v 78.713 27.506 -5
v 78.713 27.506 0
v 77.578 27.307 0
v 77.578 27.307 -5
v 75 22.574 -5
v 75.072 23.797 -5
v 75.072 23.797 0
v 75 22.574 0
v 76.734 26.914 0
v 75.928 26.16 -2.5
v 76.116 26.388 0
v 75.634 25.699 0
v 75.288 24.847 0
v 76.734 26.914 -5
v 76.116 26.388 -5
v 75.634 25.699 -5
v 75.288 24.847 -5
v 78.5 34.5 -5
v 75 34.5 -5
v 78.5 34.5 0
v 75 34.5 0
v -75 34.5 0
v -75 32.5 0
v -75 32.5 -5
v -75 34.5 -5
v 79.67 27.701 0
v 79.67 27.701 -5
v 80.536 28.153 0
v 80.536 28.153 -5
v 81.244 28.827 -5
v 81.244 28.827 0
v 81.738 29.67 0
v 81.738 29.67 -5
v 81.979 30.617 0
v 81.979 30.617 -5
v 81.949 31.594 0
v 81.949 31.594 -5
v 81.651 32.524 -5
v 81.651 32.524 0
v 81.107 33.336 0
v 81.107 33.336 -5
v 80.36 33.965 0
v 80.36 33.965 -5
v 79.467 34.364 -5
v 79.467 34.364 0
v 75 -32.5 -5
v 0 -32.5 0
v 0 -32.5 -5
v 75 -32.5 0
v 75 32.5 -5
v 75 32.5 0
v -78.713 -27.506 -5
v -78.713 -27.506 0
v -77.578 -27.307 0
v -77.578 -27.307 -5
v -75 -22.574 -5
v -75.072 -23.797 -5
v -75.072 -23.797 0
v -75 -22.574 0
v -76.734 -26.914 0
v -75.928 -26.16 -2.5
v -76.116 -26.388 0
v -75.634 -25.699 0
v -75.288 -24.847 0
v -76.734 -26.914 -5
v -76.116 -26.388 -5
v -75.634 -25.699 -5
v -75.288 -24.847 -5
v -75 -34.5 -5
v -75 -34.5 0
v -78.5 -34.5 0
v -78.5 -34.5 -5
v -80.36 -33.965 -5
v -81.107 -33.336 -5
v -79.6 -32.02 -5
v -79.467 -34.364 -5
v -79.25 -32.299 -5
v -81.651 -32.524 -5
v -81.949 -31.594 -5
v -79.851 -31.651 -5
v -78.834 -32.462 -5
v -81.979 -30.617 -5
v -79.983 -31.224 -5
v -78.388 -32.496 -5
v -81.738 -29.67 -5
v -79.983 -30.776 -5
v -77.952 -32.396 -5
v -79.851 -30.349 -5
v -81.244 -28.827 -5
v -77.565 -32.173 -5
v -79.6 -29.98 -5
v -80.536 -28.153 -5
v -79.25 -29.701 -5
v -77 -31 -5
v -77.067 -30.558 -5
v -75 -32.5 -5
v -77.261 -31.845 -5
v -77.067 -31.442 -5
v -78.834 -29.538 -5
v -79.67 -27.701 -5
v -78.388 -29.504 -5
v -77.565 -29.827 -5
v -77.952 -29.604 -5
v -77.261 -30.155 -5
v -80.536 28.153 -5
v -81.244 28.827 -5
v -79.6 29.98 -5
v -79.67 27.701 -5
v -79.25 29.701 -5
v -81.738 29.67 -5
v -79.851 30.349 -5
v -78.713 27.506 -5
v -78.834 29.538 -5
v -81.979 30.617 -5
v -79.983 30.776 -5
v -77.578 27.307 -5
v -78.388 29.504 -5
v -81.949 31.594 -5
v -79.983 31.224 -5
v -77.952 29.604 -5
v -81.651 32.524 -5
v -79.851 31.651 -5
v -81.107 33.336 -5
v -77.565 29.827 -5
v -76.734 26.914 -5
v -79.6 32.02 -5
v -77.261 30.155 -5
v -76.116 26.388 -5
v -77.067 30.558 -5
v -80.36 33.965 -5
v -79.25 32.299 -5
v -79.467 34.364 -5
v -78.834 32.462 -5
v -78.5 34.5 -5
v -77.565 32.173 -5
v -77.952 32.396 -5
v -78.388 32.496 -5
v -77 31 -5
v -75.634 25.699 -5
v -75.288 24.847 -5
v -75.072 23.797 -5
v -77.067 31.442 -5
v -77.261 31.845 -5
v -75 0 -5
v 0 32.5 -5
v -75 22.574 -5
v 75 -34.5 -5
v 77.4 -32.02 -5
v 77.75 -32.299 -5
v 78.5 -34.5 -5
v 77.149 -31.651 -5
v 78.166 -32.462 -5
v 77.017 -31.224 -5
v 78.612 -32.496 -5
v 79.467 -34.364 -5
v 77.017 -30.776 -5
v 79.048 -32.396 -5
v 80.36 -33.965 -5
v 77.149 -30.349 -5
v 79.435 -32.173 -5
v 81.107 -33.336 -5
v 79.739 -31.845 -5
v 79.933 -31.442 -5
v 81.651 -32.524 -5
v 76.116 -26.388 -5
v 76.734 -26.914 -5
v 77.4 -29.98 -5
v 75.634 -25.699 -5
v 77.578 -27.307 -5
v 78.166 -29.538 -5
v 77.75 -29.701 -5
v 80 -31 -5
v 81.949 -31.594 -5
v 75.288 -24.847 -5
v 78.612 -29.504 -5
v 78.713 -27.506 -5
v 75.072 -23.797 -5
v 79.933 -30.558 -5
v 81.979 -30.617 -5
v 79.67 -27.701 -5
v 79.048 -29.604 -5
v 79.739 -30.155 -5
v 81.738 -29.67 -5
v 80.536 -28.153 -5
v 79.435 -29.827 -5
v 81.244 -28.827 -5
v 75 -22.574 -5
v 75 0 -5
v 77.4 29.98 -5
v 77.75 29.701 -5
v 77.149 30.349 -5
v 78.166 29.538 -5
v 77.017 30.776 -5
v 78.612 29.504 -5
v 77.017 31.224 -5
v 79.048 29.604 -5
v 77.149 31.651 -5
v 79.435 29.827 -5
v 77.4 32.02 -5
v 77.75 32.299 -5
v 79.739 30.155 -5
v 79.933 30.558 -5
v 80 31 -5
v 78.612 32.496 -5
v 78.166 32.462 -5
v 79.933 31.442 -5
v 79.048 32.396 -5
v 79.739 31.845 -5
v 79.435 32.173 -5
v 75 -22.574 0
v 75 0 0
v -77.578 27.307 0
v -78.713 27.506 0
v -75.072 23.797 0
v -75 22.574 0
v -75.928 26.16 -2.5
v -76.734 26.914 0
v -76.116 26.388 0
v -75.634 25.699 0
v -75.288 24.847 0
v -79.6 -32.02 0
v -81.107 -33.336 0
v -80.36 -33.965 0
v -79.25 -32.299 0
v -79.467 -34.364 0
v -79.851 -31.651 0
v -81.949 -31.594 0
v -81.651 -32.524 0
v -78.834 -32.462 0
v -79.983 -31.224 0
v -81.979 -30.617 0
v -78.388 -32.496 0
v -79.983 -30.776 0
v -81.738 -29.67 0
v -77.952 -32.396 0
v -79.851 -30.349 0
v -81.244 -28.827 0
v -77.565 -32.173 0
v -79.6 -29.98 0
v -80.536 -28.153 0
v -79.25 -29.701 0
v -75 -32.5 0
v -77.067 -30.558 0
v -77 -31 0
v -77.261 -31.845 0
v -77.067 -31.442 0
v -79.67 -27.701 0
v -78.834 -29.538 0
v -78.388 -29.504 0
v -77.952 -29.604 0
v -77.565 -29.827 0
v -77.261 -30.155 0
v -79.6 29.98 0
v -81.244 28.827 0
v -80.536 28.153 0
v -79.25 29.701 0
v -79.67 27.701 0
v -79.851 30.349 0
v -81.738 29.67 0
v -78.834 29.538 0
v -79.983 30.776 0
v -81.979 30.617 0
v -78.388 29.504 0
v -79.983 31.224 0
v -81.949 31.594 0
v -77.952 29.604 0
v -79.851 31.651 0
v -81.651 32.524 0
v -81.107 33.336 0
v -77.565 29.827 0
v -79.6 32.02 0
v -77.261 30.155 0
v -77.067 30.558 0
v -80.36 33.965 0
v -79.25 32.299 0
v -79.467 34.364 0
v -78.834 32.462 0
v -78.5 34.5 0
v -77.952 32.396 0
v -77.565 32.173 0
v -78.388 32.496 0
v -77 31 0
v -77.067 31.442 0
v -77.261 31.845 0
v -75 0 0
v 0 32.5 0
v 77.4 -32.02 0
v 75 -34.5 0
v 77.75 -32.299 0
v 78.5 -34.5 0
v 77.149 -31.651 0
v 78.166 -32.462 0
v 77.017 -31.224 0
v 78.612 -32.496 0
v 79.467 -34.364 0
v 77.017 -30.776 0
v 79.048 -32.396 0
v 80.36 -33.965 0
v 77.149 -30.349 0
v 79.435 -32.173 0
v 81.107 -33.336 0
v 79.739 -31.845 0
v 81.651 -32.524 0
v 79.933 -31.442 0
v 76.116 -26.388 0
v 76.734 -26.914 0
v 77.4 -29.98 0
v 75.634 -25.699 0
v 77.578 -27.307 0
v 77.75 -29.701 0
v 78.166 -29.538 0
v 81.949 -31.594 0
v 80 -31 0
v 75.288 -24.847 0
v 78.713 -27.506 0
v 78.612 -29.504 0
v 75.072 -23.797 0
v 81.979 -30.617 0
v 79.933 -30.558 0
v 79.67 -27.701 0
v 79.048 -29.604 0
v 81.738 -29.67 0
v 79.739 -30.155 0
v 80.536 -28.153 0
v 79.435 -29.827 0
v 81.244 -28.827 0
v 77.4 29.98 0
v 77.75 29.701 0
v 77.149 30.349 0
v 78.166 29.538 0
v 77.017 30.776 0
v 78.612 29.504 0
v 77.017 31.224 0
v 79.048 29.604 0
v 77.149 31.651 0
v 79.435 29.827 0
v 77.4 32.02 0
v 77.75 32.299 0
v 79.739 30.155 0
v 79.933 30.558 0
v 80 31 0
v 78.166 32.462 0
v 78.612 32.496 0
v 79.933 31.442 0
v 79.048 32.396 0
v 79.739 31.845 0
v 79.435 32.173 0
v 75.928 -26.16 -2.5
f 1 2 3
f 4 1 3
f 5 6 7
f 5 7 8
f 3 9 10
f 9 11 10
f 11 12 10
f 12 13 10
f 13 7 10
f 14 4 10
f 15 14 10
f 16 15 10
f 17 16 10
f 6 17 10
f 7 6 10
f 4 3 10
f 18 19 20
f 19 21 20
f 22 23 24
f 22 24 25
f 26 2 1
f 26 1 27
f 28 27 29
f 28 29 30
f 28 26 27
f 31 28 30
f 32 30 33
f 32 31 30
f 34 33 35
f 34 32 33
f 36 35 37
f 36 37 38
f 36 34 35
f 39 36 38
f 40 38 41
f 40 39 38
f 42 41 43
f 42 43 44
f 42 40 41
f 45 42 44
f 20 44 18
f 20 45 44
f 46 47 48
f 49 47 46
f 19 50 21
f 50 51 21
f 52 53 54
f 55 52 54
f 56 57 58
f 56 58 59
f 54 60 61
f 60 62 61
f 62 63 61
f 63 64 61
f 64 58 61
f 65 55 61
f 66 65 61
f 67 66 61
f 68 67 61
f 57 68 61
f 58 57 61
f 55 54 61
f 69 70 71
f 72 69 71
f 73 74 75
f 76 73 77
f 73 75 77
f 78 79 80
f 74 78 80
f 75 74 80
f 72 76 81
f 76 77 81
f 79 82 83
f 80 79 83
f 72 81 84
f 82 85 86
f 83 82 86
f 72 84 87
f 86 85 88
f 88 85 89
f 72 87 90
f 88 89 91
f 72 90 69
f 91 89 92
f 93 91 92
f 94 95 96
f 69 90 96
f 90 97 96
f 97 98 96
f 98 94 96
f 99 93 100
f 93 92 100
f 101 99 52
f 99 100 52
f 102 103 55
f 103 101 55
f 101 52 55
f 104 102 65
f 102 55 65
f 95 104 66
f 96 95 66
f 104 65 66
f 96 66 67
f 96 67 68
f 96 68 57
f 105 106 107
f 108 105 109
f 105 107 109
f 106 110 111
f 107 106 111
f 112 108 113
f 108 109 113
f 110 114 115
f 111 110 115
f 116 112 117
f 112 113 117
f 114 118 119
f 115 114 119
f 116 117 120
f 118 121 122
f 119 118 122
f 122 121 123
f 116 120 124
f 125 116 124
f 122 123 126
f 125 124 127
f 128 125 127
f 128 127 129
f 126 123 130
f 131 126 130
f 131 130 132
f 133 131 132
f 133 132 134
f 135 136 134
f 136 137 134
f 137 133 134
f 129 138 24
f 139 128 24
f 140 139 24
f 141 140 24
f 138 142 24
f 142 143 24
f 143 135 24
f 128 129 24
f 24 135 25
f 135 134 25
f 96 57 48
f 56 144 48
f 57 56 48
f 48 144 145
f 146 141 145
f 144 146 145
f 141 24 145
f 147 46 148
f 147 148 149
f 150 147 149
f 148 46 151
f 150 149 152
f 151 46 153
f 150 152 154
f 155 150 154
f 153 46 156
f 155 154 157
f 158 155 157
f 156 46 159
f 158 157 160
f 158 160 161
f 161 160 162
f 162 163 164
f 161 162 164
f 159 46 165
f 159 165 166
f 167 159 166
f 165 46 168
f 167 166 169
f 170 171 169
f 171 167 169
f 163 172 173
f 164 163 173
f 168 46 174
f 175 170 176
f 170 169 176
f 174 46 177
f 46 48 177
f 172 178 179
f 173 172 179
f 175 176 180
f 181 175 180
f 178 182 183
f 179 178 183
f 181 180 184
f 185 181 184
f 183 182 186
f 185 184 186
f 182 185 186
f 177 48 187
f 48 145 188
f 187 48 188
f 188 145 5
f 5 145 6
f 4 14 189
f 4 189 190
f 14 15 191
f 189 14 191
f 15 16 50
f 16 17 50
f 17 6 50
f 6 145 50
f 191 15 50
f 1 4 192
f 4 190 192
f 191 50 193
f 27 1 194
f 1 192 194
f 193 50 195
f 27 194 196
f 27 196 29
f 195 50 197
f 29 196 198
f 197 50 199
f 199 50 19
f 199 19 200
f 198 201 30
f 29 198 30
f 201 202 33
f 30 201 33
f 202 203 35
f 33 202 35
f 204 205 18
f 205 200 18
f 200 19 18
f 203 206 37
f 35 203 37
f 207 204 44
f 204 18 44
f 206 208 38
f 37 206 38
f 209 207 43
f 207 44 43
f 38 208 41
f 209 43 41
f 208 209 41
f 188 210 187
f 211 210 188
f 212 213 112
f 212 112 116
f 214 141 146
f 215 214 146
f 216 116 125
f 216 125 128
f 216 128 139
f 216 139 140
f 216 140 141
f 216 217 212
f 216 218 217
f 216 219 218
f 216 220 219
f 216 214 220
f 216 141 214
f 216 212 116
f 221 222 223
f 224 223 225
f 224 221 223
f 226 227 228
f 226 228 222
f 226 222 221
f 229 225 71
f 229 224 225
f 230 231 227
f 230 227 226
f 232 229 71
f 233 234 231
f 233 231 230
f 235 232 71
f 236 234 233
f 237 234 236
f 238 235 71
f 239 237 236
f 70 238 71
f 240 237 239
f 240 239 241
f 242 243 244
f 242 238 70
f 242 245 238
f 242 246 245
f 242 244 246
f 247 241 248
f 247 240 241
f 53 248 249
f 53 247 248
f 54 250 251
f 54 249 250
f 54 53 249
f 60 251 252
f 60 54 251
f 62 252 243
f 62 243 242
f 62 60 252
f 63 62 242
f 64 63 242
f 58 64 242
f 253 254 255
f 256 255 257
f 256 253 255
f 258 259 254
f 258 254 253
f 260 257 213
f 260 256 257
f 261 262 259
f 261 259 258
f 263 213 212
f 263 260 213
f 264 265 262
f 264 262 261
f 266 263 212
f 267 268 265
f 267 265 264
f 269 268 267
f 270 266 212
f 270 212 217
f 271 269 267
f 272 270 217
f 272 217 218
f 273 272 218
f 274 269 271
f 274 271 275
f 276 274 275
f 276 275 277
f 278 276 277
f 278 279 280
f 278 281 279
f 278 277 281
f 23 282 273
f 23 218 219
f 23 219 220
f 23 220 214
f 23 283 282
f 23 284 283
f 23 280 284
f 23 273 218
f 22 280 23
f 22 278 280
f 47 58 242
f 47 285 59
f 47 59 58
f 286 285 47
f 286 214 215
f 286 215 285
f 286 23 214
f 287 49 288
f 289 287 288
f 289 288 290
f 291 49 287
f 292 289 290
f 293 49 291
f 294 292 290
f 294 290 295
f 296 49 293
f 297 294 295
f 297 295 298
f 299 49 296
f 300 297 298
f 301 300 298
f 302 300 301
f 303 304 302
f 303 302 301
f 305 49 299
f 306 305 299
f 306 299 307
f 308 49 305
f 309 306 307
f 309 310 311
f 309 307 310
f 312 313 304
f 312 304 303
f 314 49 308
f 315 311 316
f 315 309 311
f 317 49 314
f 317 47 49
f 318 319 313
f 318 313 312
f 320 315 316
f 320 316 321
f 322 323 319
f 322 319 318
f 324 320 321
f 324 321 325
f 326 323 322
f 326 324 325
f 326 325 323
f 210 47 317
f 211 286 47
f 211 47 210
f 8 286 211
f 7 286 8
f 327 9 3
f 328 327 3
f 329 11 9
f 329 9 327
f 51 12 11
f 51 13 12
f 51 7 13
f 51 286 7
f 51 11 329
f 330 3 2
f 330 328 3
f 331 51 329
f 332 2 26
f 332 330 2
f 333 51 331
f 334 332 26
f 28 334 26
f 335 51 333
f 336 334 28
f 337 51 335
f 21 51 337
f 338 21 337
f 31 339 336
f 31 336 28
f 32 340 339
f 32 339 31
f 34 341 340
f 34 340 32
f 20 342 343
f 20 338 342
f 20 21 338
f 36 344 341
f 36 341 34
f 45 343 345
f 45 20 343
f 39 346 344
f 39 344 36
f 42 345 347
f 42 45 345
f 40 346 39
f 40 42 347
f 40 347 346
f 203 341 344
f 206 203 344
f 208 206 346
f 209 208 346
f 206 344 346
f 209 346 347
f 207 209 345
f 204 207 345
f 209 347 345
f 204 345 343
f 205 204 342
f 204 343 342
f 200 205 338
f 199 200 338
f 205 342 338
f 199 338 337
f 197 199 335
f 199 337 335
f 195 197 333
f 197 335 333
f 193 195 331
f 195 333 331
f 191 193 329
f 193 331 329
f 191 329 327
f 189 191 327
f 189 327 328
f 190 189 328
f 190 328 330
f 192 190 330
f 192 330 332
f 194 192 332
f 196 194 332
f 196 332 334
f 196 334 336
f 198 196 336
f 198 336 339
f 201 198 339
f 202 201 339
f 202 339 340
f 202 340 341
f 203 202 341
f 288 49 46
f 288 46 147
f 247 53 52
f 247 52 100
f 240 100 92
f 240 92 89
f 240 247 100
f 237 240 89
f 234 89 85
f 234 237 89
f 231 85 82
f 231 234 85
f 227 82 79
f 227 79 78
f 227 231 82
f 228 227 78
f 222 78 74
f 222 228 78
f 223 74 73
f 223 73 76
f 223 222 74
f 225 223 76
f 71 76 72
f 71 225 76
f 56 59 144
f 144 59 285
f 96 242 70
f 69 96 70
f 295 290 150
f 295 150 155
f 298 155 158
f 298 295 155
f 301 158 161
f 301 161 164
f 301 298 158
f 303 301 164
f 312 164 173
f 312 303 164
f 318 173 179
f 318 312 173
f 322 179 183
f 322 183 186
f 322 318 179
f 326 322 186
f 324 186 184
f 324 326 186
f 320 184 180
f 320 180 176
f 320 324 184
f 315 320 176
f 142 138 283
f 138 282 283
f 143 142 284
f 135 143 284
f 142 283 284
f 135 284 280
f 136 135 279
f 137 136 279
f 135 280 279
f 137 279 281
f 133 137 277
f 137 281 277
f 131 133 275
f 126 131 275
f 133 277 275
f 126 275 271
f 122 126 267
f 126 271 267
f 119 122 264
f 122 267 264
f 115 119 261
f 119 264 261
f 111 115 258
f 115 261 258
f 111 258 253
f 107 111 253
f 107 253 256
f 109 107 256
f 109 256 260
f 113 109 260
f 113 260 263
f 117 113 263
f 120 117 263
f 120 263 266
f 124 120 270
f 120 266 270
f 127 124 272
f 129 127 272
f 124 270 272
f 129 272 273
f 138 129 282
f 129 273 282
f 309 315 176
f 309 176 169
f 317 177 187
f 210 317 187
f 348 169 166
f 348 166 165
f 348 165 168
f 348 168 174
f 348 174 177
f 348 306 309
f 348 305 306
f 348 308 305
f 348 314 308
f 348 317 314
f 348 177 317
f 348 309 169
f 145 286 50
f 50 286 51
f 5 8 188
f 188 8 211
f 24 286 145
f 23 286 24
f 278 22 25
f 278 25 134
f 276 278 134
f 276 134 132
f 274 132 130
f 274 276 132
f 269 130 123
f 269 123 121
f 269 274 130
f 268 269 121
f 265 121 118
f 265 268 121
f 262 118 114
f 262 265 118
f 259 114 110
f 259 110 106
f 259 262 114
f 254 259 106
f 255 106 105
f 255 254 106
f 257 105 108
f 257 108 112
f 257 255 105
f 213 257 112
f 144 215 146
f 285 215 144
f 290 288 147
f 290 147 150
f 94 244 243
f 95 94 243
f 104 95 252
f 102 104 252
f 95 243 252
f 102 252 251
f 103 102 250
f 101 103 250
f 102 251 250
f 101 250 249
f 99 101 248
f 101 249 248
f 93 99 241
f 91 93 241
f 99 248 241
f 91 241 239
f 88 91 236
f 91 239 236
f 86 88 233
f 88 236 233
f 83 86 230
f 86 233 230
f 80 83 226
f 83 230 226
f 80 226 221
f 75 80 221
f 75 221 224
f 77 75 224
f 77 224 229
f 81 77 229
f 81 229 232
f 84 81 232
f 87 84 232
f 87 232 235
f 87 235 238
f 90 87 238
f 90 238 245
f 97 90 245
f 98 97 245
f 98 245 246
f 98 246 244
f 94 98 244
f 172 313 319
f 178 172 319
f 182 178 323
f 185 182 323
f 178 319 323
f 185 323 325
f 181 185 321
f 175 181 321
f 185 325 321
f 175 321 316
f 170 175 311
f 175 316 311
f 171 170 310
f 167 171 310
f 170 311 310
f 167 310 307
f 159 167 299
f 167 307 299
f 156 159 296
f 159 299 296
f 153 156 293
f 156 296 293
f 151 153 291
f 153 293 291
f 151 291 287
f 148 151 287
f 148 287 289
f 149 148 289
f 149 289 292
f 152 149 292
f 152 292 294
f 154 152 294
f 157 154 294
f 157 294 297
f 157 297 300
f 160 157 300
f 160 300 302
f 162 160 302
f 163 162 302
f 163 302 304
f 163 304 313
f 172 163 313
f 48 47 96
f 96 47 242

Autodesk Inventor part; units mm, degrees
ref_plane "YZ Plane" through (0, 0, 0) normal (1, 0, 0) x (0, 1, 0)
ref_plane "XZ Plane" through (0, 0, 0) normal (0, 1, 0) x (-1, 0, 0)
ref_plane "XY Plane" through (0, 0, 0) normal (0, 0, 1) x (1, 0, 0)
sketch "Sketch1" plane through (0, 0, 0) normal (0, 0, 1) x (1, 0, 0)
  line L0 (0, 15198.2615) -> (0, -15198.2615) construction
  line L1 (-114.9467, 0) -> (114.9467, 0) construction
  line L2 (0, -32.5) -> (-75, -32.5)
  line L3 (-75, -32.5) -> (-75, -34.5)
  circle A0 centre (-78.5, -31) radius 1.5
  line L4 (-75, -34.5) -> (-78.5, -34.5)
  arc A1 (-78.7128, -27.5065) -> (-78.5, -34.5) centre (-78.5, -31) ccw
  line L5 (-75, -22.5739) -> (-75, 0)
  line L6 (-78.7128, -27.5065) -> (-75, -27.2803) construction
  line L7 (-75, -27.2803) -> (-75, -22.5739) construction
  spline S0 degree 2 poles (-78.7128, -27.5065) (-75, -27.2803) (-75, -22.5739) knots 1 1 1 2 2 2
  line L8 (0, -32.5) -> (75, -32.5)
  line L9 (75, -32.5) -> (75, -34.5)
  circle A2 centre (78.5, -31) radius 1.5
  line L10 (75, -34.5) -> (78.5, -34.5)
  arc A3 (78.5, -34.5) -> (78.7128, -27.5065) centre (78.5, -31) ccw
  line L11 (75, -22.5739) -> (75, 0)
  line L12 (78.7128, -27.5065) -> (75, -27.2803) construction
  line L13 (75, -27.2803) -> (75, -22.5739) construction
  spline S1 degree 2 poles (78.7128, -27.5065) (75, -27.2803) (75, -22.5739) knots 1 1 1 2 2 2
  line L14 (0, -15198.2615) -> (0, 15198.2615) construction
  line L15 (0, 32.5) -> (-75, 32.5)
  line L16 (-75, 32.5) -> (-75, 34.5)
  circle A4 centre (-78.5, 31) radius 1.5
  line L17 (-75, 34.5) -> (-78.5, 34.5)
  arc A5 (-78.5, 34.5) -> (-78.7128, 27.5065) centre (-78.5, 31) ccw
  line L18 (-75, 22.5739) -> (-75, 0)
  line L19 (-78.7128, 27.5065) -> (-75, 27.2803) construction
  line L20 (-75, 27.2803) -> (-75, 22.5739) construction
  spline S2 degree 2 poles (-78.7128, 27.5065) (-75, 27.2803) (-75, 22.5739) knots 1 1 1 2 2 2
  line L21 (0, 32.5) -> (75, 32.5)
  line L22 (75, 32.5) -> (75, 34.5)
  circle A6 centre (78.5, 31) radius 1.5
  line L23 (75, 34.5) -> (78.5, 34.5)
  arc A7 (78.7128, 27.5065) -> (78.5, 34.5) centre (78.5, 31) ccw
  line L24 (75, 22.5739) -> (75, 0)
  line L25 (78.7128, 27.5065) -> (75, 27.2803) construction
  spline S3 degree 2 poles (78.7128, 27.5065) (75, 27.2803) (75, 22.5739) knots 1 1 1 2 2 2
  line L26 (75, 27.2803) -> (75, 22.5739) construction
  point P0 (0, 0)
  dimension "d0" = 2
  dimension "d1" = 3
  dimension "d3" = 75
  dimension "d4" = 32.5
  dimension "d5" = 3.5
  dimension "d6" = 3.5
extrude "Extrusion1" add sketch "Sketch1" against normal blind 5
equation "\"d0\" = Cover_Thickness"
equation "\"d3\" = 0.5 * Heatsink_Length"
equation "\"d4\" = 0.5 * Heatsink_Width"
equation "\"d6\" = d5"
equation "\"d7\" = Heatsink_Thickness"
equation "\"Heatsink_Thickness\" = 5"
equation "\"Cover_Thickness\" = 2"
equation "\"Heatsink_Width\" = 65"
equation "\"PowerPCB_Minus_Height\" = 1.2"
equation "\"PowerPCB_Width\" = 63"
equation "\"Interface_Thickness\" = 7"
equation "\"PowerPCB_Thickness\" = 3"
equation "\"PowerPCB_Plus_Height\" = 8"
equation "\"LogicPCB_Width\" = 55"
equation "\"LogicPCB_Thickness\" = 2"
equation "\"LogicPCB_Plus_Height\" = 8"
equation "\"HostPCB_Plus_Height\" = 8"
equation "\"HostPCB_Thickness\" = 1.2"
equation "\"Heatsink_Length\" = 150"
properties part number "Heatsink" material "Aluminum 6061"
